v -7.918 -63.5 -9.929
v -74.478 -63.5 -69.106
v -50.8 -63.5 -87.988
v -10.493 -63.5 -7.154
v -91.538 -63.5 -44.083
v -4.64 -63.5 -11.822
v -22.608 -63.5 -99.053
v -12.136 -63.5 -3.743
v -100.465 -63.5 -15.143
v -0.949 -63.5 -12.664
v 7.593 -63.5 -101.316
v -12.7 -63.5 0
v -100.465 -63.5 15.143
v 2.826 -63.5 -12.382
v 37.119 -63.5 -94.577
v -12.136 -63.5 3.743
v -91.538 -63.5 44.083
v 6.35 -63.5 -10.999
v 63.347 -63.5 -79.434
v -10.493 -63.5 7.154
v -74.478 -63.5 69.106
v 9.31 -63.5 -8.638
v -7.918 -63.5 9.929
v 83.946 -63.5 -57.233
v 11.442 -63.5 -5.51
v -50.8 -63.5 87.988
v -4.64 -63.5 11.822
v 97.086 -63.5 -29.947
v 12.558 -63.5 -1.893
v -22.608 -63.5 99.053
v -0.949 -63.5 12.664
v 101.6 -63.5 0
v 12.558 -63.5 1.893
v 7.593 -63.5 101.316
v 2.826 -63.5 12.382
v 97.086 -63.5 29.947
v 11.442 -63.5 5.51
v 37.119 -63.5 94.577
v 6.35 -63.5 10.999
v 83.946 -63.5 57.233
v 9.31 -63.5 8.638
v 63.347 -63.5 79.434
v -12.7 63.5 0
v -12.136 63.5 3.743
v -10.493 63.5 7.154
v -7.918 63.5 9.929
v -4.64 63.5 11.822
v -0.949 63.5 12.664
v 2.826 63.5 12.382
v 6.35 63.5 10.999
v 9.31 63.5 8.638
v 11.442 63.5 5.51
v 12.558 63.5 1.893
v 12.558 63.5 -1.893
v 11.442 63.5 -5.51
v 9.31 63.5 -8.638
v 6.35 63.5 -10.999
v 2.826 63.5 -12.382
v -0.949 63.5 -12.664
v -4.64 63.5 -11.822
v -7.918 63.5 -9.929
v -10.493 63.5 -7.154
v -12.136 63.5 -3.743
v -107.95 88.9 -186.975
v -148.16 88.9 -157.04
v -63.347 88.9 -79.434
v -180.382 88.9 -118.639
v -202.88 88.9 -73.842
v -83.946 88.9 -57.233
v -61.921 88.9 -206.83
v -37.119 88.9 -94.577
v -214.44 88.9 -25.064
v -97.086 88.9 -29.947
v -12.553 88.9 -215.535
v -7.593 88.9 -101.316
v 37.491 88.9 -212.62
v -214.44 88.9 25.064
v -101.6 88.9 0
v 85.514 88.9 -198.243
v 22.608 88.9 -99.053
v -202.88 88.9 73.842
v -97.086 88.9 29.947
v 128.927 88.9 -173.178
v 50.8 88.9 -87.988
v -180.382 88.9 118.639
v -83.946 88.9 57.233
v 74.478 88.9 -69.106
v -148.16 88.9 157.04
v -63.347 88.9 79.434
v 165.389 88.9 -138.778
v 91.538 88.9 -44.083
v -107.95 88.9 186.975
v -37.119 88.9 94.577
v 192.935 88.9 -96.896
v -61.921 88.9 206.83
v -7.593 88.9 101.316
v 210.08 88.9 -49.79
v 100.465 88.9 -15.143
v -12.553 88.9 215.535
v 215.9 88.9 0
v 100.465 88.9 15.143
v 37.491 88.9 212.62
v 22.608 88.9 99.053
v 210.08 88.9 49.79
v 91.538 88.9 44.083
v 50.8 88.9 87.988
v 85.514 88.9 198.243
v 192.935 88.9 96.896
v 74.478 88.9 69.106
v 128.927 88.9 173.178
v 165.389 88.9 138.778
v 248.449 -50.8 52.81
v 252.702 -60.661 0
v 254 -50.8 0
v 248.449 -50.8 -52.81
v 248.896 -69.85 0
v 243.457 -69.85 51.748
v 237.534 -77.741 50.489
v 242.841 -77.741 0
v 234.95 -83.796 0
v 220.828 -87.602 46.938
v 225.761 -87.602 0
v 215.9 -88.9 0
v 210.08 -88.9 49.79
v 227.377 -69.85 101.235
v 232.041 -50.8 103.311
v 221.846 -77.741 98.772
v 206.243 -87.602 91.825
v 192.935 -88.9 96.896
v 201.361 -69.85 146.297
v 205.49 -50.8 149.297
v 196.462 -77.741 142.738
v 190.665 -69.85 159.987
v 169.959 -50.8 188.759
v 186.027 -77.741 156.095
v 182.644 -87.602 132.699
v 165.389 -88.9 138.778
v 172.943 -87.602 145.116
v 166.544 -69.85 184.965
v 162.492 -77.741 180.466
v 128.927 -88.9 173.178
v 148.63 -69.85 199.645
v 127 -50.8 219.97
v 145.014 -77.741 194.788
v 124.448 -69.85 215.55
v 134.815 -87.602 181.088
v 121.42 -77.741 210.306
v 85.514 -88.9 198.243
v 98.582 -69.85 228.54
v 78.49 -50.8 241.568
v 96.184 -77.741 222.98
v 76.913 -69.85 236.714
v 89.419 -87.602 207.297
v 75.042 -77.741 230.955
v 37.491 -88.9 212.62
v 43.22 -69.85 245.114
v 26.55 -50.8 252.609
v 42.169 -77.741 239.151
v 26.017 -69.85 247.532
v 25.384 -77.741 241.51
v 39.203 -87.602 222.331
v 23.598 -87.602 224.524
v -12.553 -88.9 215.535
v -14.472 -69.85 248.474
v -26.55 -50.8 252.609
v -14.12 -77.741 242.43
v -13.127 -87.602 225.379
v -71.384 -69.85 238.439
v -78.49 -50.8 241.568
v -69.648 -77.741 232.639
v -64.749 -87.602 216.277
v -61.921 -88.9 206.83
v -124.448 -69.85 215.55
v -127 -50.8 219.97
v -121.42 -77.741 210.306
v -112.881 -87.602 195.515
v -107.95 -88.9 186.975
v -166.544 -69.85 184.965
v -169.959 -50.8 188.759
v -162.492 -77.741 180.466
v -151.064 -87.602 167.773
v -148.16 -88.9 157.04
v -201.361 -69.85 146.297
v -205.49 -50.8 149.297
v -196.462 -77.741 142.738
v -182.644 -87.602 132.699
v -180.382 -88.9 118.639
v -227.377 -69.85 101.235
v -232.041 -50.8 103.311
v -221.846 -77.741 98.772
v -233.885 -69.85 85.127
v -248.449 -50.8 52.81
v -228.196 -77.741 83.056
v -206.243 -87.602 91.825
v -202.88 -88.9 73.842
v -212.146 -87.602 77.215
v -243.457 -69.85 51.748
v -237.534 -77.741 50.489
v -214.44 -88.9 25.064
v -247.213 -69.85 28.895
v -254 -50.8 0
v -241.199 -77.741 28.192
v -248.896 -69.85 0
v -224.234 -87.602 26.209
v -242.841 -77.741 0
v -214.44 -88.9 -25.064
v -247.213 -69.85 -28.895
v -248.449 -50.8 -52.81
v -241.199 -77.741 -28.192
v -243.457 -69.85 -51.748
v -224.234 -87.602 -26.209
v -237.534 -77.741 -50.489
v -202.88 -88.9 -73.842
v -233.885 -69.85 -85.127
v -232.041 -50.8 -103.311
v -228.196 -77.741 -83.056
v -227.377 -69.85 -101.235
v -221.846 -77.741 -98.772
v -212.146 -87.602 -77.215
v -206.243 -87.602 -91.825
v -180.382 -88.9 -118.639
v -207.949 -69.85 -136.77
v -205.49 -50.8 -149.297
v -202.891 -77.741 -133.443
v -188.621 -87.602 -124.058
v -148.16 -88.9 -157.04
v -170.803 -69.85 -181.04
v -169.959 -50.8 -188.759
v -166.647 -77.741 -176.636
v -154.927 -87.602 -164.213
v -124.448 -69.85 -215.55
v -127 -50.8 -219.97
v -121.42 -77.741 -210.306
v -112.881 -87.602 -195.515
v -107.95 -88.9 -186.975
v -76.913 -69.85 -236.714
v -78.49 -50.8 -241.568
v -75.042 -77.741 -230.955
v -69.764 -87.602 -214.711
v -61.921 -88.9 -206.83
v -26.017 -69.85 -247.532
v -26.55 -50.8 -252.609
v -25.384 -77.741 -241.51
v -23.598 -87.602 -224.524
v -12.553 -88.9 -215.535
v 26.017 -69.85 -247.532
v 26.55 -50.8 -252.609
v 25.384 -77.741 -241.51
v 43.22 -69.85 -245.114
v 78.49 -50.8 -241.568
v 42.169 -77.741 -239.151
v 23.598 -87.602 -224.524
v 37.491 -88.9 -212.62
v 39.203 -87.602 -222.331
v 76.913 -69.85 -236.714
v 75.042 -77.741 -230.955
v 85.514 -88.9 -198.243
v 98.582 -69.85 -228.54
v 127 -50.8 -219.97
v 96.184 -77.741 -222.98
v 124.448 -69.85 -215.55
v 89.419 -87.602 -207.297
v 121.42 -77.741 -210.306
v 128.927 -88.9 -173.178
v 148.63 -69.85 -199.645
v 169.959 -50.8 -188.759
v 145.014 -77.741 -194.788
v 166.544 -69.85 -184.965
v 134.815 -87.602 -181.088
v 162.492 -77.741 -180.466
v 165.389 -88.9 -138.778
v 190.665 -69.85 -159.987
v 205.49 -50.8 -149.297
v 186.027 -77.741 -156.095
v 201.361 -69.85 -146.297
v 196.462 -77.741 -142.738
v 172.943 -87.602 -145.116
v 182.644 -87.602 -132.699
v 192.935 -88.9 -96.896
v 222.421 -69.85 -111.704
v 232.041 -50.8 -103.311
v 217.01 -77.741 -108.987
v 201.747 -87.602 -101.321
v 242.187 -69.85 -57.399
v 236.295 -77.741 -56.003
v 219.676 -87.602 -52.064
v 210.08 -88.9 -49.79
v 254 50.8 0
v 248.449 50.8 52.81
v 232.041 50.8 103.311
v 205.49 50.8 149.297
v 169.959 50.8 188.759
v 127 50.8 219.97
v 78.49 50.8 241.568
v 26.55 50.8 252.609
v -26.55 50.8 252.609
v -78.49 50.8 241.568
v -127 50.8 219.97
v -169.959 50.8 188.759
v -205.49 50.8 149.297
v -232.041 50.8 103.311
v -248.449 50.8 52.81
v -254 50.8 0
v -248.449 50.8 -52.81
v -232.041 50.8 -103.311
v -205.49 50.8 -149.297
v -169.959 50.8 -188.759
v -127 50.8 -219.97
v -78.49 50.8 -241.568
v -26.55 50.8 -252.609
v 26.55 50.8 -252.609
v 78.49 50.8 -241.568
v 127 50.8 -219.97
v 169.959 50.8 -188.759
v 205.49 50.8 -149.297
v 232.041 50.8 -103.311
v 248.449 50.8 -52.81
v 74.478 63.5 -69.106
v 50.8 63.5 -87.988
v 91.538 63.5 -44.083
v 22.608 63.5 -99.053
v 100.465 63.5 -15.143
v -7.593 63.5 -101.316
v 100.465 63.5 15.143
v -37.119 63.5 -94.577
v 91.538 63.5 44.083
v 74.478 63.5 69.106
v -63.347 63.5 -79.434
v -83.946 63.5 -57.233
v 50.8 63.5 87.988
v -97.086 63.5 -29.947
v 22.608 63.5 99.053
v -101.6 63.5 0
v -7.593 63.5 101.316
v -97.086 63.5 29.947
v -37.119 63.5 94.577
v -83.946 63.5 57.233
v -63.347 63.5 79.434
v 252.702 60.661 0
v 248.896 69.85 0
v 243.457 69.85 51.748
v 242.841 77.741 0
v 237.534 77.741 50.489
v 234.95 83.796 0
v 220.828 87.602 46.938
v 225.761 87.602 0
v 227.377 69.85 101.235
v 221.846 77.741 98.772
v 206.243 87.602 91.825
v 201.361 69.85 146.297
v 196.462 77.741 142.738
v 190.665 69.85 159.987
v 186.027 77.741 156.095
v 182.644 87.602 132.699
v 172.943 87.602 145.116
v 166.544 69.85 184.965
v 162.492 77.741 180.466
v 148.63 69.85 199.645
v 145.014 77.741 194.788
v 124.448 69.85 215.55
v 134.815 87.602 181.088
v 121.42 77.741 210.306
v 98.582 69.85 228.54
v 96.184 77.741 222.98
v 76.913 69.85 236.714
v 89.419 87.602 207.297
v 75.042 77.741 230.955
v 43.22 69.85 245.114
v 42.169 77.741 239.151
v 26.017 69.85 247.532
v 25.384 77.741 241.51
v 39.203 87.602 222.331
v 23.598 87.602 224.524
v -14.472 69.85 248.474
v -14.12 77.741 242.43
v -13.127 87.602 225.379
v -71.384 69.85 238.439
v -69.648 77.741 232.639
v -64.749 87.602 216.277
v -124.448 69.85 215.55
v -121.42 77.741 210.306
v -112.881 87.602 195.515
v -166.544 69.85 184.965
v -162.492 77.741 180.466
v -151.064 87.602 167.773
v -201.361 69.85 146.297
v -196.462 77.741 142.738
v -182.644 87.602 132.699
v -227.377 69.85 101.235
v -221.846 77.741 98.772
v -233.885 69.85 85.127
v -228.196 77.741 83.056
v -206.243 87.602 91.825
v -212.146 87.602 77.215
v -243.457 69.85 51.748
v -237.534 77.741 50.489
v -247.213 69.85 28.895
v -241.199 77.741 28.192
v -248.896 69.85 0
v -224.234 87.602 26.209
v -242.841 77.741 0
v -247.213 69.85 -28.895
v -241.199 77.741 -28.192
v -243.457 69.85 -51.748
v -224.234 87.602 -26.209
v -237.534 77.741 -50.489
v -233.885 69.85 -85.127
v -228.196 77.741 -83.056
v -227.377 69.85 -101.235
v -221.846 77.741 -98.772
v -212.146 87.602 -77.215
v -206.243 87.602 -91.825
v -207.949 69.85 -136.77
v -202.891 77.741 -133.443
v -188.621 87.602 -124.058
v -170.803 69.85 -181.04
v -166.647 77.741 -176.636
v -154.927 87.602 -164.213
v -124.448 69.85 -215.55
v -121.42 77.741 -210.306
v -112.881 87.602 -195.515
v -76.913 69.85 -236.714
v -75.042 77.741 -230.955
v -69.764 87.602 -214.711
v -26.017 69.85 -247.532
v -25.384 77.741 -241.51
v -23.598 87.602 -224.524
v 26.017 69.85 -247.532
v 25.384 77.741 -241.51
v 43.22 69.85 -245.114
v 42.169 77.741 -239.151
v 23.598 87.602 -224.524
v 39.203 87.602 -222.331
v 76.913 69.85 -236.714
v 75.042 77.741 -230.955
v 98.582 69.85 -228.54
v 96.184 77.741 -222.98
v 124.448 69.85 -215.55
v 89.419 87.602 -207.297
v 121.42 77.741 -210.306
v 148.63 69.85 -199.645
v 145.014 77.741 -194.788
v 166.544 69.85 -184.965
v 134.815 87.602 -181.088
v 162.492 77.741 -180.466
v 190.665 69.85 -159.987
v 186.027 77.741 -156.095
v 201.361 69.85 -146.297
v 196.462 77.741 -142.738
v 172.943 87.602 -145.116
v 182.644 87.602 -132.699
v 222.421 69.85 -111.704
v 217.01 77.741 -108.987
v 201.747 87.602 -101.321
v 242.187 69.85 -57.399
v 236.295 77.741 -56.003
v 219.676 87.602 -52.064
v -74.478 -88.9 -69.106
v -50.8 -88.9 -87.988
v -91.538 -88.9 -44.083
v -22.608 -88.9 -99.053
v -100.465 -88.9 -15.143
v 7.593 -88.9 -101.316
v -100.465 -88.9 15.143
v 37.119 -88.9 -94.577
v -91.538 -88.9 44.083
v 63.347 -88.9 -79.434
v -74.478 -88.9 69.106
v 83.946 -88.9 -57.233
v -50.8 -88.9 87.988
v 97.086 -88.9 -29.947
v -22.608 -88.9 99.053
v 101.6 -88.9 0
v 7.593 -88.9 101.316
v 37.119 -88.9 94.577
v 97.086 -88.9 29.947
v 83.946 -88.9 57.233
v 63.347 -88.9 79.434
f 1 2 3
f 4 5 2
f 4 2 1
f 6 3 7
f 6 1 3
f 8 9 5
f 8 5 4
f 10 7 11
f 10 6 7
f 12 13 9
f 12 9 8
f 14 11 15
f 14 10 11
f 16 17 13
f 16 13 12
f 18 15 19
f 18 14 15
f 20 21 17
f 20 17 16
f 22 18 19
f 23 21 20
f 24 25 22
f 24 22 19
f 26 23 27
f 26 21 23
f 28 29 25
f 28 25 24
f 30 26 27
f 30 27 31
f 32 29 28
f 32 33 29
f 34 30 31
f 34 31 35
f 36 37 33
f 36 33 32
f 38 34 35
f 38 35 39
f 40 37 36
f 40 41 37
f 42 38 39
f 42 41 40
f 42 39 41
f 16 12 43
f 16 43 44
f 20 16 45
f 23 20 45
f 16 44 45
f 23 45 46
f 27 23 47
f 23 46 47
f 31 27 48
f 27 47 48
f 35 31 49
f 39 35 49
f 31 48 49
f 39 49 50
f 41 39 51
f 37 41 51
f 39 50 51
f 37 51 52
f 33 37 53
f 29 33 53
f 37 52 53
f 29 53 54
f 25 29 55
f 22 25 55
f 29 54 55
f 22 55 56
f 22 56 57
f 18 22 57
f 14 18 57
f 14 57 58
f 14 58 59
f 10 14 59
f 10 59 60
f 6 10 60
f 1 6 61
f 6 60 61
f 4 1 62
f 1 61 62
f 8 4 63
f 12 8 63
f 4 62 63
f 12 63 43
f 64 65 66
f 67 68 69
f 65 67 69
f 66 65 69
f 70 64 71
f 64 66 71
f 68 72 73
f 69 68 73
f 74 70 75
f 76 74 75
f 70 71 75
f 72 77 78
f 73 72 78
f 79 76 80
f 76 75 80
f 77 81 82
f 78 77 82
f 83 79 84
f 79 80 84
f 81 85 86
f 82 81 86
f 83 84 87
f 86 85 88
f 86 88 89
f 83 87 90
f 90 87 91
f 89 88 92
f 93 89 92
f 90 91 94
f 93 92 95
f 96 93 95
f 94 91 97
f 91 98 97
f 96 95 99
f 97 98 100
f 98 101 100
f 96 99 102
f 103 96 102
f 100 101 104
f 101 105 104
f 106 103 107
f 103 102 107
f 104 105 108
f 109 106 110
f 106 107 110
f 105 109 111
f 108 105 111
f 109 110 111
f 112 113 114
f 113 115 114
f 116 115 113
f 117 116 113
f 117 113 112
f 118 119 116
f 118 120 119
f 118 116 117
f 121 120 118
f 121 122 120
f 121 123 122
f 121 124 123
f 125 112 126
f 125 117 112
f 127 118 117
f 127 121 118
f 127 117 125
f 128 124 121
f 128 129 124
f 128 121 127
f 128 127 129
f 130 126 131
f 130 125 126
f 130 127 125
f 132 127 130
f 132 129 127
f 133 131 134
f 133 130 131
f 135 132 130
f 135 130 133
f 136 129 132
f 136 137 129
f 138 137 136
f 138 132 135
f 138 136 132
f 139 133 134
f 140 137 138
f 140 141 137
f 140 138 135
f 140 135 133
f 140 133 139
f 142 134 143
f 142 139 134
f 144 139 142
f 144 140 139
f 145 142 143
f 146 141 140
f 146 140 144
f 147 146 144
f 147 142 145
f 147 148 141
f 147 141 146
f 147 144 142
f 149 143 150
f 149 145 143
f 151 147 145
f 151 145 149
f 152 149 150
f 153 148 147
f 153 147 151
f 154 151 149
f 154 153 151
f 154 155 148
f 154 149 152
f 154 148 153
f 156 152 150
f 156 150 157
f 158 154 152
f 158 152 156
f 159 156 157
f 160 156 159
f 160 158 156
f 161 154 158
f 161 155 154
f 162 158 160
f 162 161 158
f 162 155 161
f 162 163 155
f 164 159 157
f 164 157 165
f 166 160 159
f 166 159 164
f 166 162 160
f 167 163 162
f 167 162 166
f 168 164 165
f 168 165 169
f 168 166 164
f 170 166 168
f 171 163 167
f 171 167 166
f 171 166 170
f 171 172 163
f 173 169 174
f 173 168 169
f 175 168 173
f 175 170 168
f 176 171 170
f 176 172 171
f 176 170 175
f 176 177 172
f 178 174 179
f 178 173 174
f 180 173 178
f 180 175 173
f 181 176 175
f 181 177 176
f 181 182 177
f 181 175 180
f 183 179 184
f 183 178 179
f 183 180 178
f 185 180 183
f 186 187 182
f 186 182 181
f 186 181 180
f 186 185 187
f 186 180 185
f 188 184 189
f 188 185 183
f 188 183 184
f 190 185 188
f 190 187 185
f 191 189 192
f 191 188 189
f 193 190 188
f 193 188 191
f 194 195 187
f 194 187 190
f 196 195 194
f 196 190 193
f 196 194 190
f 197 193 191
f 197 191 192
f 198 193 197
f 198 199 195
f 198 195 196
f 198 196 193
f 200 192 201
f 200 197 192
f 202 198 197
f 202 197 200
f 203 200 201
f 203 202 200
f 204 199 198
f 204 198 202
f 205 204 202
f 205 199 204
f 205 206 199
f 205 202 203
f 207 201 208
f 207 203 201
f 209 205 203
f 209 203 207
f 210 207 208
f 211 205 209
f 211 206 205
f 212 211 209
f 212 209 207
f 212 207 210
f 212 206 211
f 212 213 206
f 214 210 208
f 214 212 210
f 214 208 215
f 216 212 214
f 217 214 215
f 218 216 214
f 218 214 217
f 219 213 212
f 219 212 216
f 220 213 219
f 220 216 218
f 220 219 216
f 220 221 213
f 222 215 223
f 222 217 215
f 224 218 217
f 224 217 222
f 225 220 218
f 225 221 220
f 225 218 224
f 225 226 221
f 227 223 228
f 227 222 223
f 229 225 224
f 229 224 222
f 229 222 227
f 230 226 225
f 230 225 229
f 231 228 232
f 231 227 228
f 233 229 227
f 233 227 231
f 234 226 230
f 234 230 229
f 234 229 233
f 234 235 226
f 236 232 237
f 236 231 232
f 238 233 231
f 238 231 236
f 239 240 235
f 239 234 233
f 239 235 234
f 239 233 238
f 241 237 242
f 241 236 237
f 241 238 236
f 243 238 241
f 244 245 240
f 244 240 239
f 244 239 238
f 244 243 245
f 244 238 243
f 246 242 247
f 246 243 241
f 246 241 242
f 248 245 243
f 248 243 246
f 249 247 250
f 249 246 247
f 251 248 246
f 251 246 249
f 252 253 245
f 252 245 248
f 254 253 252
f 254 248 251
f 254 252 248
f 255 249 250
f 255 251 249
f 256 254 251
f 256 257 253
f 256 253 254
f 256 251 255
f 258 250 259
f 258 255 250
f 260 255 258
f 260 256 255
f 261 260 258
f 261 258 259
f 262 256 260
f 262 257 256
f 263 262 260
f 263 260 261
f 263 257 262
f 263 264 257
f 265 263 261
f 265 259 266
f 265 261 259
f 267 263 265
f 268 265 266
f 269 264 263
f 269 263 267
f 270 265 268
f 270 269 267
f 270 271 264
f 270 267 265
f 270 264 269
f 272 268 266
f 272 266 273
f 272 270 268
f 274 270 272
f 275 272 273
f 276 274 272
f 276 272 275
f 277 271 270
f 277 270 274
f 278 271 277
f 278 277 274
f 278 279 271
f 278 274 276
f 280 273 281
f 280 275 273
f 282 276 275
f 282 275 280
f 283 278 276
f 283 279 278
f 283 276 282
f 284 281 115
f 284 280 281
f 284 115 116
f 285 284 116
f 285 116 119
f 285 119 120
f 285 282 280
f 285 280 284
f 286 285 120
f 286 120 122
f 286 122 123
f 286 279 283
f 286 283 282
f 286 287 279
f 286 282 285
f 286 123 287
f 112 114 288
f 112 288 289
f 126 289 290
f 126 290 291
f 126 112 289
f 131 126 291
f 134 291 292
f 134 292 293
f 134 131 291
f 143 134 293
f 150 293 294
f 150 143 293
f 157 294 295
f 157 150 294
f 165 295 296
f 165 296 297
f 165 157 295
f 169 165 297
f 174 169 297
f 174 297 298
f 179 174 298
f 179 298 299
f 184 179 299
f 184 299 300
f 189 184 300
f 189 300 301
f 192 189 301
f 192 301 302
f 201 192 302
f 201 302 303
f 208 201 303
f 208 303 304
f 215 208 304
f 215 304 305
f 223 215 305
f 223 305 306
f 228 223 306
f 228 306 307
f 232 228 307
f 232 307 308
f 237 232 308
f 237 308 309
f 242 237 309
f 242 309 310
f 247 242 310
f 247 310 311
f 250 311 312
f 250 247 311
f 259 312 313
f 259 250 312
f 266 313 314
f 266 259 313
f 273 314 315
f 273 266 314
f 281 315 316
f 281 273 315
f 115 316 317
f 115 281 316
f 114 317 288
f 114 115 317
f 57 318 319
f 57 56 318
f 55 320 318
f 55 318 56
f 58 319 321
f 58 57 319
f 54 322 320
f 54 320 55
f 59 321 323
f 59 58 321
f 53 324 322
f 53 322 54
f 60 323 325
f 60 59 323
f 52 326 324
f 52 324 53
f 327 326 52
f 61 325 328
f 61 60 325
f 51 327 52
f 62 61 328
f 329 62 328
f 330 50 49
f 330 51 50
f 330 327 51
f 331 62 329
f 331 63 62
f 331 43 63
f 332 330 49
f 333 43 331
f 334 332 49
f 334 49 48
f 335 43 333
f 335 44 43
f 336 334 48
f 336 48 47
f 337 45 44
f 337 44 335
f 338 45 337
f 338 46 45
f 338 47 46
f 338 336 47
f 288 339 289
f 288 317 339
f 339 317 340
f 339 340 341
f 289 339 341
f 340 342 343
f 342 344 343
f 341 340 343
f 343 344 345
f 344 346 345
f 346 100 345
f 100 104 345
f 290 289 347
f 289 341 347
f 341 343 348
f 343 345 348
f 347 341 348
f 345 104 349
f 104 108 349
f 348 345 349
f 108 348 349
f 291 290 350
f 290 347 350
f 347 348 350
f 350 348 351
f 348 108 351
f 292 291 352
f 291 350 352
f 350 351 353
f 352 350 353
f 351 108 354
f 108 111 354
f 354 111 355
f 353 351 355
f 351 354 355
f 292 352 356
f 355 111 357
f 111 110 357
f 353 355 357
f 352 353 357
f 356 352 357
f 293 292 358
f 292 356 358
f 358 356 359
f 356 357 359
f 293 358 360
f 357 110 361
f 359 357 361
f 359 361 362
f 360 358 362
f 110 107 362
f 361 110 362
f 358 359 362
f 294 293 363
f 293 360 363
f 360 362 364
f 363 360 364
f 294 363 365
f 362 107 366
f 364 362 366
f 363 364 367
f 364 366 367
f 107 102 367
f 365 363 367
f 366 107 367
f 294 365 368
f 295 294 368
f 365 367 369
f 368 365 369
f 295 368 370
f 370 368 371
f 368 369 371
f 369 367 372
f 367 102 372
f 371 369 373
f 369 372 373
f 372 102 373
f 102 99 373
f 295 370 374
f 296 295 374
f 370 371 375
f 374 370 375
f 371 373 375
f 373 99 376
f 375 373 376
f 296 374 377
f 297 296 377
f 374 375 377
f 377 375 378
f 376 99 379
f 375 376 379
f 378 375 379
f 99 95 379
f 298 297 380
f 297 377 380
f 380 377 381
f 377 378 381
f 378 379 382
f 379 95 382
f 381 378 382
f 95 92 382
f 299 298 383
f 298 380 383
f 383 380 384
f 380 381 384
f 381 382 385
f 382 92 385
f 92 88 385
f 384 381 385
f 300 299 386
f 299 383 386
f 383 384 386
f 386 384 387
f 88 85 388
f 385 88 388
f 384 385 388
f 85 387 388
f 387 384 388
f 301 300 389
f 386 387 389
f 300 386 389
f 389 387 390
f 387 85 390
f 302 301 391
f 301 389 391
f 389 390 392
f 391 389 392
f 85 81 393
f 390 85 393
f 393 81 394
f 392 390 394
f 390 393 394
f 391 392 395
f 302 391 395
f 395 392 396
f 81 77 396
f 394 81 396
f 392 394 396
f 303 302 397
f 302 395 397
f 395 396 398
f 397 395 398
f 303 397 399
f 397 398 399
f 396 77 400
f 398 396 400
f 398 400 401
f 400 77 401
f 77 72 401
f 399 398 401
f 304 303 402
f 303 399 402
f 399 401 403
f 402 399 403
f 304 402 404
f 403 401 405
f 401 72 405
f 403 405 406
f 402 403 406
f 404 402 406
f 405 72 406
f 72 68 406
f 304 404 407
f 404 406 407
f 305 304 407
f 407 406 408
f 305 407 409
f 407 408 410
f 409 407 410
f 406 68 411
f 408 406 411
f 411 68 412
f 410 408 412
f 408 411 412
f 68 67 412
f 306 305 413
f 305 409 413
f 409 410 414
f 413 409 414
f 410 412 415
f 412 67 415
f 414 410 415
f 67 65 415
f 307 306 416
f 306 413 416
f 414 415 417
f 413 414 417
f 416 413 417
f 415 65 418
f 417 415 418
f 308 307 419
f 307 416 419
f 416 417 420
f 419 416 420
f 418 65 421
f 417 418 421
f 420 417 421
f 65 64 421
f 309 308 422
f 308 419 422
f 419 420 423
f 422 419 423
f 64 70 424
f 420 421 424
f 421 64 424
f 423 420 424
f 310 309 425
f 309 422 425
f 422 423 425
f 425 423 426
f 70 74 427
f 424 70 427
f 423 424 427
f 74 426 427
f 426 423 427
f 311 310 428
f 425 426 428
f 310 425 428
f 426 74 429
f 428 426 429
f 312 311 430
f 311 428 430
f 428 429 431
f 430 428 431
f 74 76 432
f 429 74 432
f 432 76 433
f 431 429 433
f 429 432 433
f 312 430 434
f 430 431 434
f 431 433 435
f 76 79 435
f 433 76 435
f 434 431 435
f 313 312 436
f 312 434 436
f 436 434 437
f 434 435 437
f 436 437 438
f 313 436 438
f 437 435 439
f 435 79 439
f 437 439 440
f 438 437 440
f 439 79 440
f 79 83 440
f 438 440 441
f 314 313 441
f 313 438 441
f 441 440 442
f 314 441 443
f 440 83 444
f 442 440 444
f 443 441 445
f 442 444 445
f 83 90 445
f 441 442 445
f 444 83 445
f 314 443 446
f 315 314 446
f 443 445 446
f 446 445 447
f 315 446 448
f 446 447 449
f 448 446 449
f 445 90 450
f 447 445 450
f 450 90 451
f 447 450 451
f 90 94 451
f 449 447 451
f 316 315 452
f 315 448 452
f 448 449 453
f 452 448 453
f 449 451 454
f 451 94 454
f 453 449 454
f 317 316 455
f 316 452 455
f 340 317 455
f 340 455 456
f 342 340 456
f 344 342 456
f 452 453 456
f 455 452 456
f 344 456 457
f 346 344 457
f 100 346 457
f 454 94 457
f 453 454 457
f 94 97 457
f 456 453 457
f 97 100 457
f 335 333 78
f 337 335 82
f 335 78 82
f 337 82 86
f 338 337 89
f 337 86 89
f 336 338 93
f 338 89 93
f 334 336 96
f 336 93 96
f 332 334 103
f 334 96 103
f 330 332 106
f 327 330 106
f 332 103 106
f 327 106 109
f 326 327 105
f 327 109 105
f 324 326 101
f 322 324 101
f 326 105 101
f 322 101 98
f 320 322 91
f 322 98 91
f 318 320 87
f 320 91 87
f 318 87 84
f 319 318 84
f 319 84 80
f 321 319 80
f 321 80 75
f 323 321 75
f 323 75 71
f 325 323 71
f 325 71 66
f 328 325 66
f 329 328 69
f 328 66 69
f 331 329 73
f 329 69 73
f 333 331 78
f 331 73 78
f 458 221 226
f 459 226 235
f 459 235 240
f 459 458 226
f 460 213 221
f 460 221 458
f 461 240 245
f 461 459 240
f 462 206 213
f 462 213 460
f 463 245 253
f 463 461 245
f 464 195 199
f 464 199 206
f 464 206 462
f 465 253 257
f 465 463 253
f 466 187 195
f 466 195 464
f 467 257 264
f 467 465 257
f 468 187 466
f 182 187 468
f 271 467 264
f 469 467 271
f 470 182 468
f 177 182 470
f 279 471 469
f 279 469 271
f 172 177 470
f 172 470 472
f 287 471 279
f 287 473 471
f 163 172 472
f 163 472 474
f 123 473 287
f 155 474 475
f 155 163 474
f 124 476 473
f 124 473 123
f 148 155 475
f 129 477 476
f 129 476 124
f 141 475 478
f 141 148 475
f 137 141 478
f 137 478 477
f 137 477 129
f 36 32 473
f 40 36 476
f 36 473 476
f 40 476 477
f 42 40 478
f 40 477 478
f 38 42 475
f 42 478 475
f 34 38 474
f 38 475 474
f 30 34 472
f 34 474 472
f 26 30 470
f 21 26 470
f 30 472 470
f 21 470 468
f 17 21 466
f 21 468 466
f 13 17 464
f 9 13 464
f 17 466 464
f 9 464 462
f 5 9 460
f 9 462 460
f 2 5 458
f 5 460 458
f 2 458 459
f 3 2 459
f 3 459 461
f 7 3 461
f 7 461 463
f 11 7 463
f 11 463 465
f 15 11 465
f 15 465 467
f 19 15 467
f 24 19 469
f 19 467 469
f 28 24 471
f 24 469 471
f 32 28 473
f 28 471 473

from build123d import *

# Parameters (mm, degrees)
F0_R     = 254
F1_DEPTH = 88.9
F2_R     = 101.6
F3_DEPTH = 25.4
F4_R     = 101.6
F5_DEPTH = 25.4
F6_R     = 38.1
F7_R     = 12.7
F8_DEPTH = 177.8


with BuildPart() as f1:
    # F0 (on Front) → F1 (new body, symmetric)
    with BuildSketch(Plane.XZ):
        Circle(F0_R)
    extrude(amount=F1_DEPTH, both=True)

    # F2 (on face) → F3 (cut)
    with BuildSketch(Plane.XZ.offset(88.9)):
        Circle(F2_R)
    extrude(amount=-F3_DEPTH, mode=Mode.SUBTRACT)

    # F4 (on face) → F5 (cut)
    with BuildSketch(Plane(origin=(0, 88.9, 0), x_dir=(-1, 0, 0), z_dir=(0, 1, 0))):
        Circle(F4_R)
    extrude(amount=-F5_DEPTH, mode=Mode.SUBTRACT)

    # F6
    f6_edges = [f1.edges().sort_by_distance(p)[0] for p in [
        (-254, 88.9, 0),
        (-254, -88.9, 0),
    ]]
    fillet(f6_edges, radius=F6_R)

    # F7 (on face) → F8 (cut, symmetric)
    with BuildSketch(Plane(origin=(0, 63.5, 0), x_dir=(-1, 0, 0), z_dir=(0, 1, 0))):
        Circle(F7_R)
    extrude(amount=F8_DEPTH, both=True, mode=Mode.SUBTRACT)


solid = f1.part
